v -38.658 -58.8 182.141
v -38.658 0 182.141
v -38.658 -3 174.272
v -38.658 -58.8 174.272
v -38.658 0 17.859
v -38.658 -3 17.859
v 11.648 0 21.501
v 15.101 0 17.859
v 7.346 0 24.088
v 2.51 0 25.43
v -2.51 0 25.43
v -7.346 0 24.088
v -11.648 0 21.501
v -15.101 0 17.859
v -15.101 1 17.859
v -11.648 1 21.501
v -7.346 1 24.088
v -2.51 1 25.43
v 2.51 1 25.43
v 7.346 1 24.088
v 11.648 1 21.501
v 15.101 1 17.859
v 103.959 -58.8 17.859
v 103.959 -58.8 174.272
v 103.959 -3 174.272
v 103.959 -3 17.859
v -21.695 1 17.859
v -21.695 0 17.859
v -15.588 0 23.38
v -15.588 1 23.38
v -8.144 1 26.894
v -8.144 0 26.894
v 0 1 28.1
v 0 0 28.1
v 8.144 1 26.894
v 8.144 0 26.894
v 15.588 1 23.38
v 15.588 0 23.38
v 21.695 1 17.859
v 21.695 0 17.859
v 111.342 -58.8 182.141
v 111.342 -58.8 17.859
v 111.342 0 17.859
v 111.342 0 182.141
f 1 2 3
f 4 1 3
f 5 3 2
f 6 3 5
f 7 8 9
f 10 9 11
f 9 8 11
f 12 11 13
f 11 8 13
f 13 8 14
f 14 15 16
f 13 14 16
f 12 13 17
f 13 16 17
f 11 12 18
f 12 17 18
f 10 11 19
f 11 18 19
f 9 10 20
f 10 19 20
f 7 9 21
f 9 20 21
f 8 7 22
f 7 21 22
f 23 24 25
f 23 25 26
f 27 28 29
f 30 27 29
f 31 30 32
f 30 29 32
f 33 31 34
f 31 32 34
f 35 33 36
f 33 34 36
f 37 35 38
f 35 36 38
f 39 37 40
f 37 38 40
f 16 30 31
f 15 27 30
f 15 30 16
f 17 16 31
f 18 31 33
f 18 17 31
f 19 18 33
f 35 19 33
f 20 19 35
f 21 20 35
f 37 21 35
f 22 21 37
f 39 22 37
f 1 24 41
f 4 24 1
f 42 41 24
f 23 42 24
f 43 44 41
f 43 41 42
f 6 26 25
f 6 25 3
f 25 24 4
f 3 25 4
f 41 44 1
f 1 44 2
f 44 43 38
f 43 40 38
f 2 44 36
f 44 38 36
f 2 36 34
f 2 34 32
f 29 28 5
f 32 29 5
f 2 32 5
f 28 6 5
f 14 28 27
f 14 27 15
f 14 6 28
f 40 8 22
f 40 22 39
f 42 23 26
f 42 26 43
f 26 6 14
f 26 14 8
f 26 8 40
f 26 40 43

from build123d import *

# Parameters (mm, degrees)
SKETCH1_R           = 28.1
BOSS_EXTRUDE1_DEPTH = 1
SKETCH2_R           = 18.6
CUT_EXTRUDE1_DEPTH  = 58.8
SKETCH3_W           = 222.683092022
SKETCH3_H           = 364.2827524
BOSS_EXTRUDE2_DEPTH = 58.8
SKETCH4_W           = 207.917403516
SKETCH4_H           = 348.54429772
CUT_EXTRUDE2_DEPTH  = 55.8
SKETCH9_R           = 3
CUT_EXTRUDE8_DEPTH  = 10
SKETCH10_R          = 3.75
CUT_EXTRUDE9_DEPTH  = 10
CUT_EXTRUDE14_DEPTH = 500
SKETCH6_R           = 3.75
CUT_EXTRUDE5_DEPTH  = 400
SKETCH8_R           = 10
CUT_EXTRUDE7_DEPTH  = 10


with BuildPart() as part:
    # Sketch1 → Boss-Extrude1 (new body)
    with BuildSketch(Plane(origin=(0, 0, 0), x_dir=(1, 0, 0), z_dir=(0, 1, 0))):
        Circle(SKETCH1_R)
    extrude(amount=BOSS_EXTRUDE1_DEPTH)

    # Sketch2 → Cut-Extrude1 (cut)
    with BuildSketch(Plane(origin=(0, 1, 0), x_dir=(1, 0, 0), z_dir=(0, 1, 0))):
        with Locations((0, -7)):
            Circle(SKETCH2_R)
    extrude(amount=-CUT_EXTRUDE1_DEPTH, mode=Mode.SUBTRACT)

    # Sketch3 → Boss-Extrude2 (add)
    with BuildSketch(Plane(origin=(0, 0, 0), x_dir=(-1, 0, 0), z_dir=(0, -1, 0))):
        Rectangle(SKETCH3_W, SKETCH3_H)
    extrude(amount=BOSS_EXTRUDE2_DEPTH)

    # Sketch4 → Cut-Extrude2 (cut)
    with BuildSketch(Plane(origin=(0, -58.8, 0), x_dir=(-1, 0, 0), z_dir=(0, -1, 0))):
        Rectangle(SKETCH4_W, SKETCH4_H)
    extrude(amount=-CUT_EXTRUDE2_DEPTH, mode=Mode.SUBTRACT)

    # Sketch9 → Cut-Extrude8 (cut)
    with BuildSketch(Plane(origin=(0, 0, 0), x_dir=(1, 0, 0), z_dir=(0, 1, 0))):
        with Locations((0, -7)):
            Circle(SKETCH9_R)
    extrude(amount=-CUT_EXTRUDE8_DEPTH, mode=Mode.SUBTRACT)

    # Sketch10 → Cut-Extrude9 (cut)
    with BuildSketch(Plane(origin=(0, 1, 0), x_dir=(1, 0, 0), z_dir=(0, 1, 0))):
        with Locations((0, 19.85)):
            Circle(SKETCH10_R)
    extrude(amount=-CUT_EXTRUDE9_DEPTH, mode=Mode.SUBTRACT)

    # Sketch11 → Cut-Extrude14 (cut)
    with BuildSketch(Plane(origin=(0, -58.8, 0), x_dir=(-1, 0, 0), z_dir=(0, -1, 0))):
        Polygon((38.658453989, -17.8586238), (-111.341546011, -17.8586238), (-111.341546011, 182.1413762), (111.341546011, 182.1413762), (111.341546011, -182.1413762), (38.658453989, -182.1413762), align=None)
    extrude(amount=-CUT_EXTRUDE14_DEPTH, mode=Mode.SUBTRACT)

    # Sketch6 → Cut-Extrude5 (cut)
    with BuildSketch(Plane(origin=(0, 1, 0), x_dir=(1, 0, 0), z_dir=(0, 1, 0))):
        with Locations((0, 18.75)):
            Circle(SKETCH6_R)
    extrude(amount=-CUT_EXTRUDE5_DEPTH, mode=Mode.SUBTRACT)

    # Sketch8 → Cut-Extrude7 (cut)
    with BuildSketch(Plane(origin=(0, 0, -182.1413762), x_dir=(-1, 0, 0), z_dir=(0, 0, -1))):
        with Locations((-86.573671766, -25.011155335)):
            Circle(SKETCH8_R)
    extrude(amount=-CUT_EXTRUDE7_DEPTH, mode=Mode.SUBTRACT)


solid = part.part
